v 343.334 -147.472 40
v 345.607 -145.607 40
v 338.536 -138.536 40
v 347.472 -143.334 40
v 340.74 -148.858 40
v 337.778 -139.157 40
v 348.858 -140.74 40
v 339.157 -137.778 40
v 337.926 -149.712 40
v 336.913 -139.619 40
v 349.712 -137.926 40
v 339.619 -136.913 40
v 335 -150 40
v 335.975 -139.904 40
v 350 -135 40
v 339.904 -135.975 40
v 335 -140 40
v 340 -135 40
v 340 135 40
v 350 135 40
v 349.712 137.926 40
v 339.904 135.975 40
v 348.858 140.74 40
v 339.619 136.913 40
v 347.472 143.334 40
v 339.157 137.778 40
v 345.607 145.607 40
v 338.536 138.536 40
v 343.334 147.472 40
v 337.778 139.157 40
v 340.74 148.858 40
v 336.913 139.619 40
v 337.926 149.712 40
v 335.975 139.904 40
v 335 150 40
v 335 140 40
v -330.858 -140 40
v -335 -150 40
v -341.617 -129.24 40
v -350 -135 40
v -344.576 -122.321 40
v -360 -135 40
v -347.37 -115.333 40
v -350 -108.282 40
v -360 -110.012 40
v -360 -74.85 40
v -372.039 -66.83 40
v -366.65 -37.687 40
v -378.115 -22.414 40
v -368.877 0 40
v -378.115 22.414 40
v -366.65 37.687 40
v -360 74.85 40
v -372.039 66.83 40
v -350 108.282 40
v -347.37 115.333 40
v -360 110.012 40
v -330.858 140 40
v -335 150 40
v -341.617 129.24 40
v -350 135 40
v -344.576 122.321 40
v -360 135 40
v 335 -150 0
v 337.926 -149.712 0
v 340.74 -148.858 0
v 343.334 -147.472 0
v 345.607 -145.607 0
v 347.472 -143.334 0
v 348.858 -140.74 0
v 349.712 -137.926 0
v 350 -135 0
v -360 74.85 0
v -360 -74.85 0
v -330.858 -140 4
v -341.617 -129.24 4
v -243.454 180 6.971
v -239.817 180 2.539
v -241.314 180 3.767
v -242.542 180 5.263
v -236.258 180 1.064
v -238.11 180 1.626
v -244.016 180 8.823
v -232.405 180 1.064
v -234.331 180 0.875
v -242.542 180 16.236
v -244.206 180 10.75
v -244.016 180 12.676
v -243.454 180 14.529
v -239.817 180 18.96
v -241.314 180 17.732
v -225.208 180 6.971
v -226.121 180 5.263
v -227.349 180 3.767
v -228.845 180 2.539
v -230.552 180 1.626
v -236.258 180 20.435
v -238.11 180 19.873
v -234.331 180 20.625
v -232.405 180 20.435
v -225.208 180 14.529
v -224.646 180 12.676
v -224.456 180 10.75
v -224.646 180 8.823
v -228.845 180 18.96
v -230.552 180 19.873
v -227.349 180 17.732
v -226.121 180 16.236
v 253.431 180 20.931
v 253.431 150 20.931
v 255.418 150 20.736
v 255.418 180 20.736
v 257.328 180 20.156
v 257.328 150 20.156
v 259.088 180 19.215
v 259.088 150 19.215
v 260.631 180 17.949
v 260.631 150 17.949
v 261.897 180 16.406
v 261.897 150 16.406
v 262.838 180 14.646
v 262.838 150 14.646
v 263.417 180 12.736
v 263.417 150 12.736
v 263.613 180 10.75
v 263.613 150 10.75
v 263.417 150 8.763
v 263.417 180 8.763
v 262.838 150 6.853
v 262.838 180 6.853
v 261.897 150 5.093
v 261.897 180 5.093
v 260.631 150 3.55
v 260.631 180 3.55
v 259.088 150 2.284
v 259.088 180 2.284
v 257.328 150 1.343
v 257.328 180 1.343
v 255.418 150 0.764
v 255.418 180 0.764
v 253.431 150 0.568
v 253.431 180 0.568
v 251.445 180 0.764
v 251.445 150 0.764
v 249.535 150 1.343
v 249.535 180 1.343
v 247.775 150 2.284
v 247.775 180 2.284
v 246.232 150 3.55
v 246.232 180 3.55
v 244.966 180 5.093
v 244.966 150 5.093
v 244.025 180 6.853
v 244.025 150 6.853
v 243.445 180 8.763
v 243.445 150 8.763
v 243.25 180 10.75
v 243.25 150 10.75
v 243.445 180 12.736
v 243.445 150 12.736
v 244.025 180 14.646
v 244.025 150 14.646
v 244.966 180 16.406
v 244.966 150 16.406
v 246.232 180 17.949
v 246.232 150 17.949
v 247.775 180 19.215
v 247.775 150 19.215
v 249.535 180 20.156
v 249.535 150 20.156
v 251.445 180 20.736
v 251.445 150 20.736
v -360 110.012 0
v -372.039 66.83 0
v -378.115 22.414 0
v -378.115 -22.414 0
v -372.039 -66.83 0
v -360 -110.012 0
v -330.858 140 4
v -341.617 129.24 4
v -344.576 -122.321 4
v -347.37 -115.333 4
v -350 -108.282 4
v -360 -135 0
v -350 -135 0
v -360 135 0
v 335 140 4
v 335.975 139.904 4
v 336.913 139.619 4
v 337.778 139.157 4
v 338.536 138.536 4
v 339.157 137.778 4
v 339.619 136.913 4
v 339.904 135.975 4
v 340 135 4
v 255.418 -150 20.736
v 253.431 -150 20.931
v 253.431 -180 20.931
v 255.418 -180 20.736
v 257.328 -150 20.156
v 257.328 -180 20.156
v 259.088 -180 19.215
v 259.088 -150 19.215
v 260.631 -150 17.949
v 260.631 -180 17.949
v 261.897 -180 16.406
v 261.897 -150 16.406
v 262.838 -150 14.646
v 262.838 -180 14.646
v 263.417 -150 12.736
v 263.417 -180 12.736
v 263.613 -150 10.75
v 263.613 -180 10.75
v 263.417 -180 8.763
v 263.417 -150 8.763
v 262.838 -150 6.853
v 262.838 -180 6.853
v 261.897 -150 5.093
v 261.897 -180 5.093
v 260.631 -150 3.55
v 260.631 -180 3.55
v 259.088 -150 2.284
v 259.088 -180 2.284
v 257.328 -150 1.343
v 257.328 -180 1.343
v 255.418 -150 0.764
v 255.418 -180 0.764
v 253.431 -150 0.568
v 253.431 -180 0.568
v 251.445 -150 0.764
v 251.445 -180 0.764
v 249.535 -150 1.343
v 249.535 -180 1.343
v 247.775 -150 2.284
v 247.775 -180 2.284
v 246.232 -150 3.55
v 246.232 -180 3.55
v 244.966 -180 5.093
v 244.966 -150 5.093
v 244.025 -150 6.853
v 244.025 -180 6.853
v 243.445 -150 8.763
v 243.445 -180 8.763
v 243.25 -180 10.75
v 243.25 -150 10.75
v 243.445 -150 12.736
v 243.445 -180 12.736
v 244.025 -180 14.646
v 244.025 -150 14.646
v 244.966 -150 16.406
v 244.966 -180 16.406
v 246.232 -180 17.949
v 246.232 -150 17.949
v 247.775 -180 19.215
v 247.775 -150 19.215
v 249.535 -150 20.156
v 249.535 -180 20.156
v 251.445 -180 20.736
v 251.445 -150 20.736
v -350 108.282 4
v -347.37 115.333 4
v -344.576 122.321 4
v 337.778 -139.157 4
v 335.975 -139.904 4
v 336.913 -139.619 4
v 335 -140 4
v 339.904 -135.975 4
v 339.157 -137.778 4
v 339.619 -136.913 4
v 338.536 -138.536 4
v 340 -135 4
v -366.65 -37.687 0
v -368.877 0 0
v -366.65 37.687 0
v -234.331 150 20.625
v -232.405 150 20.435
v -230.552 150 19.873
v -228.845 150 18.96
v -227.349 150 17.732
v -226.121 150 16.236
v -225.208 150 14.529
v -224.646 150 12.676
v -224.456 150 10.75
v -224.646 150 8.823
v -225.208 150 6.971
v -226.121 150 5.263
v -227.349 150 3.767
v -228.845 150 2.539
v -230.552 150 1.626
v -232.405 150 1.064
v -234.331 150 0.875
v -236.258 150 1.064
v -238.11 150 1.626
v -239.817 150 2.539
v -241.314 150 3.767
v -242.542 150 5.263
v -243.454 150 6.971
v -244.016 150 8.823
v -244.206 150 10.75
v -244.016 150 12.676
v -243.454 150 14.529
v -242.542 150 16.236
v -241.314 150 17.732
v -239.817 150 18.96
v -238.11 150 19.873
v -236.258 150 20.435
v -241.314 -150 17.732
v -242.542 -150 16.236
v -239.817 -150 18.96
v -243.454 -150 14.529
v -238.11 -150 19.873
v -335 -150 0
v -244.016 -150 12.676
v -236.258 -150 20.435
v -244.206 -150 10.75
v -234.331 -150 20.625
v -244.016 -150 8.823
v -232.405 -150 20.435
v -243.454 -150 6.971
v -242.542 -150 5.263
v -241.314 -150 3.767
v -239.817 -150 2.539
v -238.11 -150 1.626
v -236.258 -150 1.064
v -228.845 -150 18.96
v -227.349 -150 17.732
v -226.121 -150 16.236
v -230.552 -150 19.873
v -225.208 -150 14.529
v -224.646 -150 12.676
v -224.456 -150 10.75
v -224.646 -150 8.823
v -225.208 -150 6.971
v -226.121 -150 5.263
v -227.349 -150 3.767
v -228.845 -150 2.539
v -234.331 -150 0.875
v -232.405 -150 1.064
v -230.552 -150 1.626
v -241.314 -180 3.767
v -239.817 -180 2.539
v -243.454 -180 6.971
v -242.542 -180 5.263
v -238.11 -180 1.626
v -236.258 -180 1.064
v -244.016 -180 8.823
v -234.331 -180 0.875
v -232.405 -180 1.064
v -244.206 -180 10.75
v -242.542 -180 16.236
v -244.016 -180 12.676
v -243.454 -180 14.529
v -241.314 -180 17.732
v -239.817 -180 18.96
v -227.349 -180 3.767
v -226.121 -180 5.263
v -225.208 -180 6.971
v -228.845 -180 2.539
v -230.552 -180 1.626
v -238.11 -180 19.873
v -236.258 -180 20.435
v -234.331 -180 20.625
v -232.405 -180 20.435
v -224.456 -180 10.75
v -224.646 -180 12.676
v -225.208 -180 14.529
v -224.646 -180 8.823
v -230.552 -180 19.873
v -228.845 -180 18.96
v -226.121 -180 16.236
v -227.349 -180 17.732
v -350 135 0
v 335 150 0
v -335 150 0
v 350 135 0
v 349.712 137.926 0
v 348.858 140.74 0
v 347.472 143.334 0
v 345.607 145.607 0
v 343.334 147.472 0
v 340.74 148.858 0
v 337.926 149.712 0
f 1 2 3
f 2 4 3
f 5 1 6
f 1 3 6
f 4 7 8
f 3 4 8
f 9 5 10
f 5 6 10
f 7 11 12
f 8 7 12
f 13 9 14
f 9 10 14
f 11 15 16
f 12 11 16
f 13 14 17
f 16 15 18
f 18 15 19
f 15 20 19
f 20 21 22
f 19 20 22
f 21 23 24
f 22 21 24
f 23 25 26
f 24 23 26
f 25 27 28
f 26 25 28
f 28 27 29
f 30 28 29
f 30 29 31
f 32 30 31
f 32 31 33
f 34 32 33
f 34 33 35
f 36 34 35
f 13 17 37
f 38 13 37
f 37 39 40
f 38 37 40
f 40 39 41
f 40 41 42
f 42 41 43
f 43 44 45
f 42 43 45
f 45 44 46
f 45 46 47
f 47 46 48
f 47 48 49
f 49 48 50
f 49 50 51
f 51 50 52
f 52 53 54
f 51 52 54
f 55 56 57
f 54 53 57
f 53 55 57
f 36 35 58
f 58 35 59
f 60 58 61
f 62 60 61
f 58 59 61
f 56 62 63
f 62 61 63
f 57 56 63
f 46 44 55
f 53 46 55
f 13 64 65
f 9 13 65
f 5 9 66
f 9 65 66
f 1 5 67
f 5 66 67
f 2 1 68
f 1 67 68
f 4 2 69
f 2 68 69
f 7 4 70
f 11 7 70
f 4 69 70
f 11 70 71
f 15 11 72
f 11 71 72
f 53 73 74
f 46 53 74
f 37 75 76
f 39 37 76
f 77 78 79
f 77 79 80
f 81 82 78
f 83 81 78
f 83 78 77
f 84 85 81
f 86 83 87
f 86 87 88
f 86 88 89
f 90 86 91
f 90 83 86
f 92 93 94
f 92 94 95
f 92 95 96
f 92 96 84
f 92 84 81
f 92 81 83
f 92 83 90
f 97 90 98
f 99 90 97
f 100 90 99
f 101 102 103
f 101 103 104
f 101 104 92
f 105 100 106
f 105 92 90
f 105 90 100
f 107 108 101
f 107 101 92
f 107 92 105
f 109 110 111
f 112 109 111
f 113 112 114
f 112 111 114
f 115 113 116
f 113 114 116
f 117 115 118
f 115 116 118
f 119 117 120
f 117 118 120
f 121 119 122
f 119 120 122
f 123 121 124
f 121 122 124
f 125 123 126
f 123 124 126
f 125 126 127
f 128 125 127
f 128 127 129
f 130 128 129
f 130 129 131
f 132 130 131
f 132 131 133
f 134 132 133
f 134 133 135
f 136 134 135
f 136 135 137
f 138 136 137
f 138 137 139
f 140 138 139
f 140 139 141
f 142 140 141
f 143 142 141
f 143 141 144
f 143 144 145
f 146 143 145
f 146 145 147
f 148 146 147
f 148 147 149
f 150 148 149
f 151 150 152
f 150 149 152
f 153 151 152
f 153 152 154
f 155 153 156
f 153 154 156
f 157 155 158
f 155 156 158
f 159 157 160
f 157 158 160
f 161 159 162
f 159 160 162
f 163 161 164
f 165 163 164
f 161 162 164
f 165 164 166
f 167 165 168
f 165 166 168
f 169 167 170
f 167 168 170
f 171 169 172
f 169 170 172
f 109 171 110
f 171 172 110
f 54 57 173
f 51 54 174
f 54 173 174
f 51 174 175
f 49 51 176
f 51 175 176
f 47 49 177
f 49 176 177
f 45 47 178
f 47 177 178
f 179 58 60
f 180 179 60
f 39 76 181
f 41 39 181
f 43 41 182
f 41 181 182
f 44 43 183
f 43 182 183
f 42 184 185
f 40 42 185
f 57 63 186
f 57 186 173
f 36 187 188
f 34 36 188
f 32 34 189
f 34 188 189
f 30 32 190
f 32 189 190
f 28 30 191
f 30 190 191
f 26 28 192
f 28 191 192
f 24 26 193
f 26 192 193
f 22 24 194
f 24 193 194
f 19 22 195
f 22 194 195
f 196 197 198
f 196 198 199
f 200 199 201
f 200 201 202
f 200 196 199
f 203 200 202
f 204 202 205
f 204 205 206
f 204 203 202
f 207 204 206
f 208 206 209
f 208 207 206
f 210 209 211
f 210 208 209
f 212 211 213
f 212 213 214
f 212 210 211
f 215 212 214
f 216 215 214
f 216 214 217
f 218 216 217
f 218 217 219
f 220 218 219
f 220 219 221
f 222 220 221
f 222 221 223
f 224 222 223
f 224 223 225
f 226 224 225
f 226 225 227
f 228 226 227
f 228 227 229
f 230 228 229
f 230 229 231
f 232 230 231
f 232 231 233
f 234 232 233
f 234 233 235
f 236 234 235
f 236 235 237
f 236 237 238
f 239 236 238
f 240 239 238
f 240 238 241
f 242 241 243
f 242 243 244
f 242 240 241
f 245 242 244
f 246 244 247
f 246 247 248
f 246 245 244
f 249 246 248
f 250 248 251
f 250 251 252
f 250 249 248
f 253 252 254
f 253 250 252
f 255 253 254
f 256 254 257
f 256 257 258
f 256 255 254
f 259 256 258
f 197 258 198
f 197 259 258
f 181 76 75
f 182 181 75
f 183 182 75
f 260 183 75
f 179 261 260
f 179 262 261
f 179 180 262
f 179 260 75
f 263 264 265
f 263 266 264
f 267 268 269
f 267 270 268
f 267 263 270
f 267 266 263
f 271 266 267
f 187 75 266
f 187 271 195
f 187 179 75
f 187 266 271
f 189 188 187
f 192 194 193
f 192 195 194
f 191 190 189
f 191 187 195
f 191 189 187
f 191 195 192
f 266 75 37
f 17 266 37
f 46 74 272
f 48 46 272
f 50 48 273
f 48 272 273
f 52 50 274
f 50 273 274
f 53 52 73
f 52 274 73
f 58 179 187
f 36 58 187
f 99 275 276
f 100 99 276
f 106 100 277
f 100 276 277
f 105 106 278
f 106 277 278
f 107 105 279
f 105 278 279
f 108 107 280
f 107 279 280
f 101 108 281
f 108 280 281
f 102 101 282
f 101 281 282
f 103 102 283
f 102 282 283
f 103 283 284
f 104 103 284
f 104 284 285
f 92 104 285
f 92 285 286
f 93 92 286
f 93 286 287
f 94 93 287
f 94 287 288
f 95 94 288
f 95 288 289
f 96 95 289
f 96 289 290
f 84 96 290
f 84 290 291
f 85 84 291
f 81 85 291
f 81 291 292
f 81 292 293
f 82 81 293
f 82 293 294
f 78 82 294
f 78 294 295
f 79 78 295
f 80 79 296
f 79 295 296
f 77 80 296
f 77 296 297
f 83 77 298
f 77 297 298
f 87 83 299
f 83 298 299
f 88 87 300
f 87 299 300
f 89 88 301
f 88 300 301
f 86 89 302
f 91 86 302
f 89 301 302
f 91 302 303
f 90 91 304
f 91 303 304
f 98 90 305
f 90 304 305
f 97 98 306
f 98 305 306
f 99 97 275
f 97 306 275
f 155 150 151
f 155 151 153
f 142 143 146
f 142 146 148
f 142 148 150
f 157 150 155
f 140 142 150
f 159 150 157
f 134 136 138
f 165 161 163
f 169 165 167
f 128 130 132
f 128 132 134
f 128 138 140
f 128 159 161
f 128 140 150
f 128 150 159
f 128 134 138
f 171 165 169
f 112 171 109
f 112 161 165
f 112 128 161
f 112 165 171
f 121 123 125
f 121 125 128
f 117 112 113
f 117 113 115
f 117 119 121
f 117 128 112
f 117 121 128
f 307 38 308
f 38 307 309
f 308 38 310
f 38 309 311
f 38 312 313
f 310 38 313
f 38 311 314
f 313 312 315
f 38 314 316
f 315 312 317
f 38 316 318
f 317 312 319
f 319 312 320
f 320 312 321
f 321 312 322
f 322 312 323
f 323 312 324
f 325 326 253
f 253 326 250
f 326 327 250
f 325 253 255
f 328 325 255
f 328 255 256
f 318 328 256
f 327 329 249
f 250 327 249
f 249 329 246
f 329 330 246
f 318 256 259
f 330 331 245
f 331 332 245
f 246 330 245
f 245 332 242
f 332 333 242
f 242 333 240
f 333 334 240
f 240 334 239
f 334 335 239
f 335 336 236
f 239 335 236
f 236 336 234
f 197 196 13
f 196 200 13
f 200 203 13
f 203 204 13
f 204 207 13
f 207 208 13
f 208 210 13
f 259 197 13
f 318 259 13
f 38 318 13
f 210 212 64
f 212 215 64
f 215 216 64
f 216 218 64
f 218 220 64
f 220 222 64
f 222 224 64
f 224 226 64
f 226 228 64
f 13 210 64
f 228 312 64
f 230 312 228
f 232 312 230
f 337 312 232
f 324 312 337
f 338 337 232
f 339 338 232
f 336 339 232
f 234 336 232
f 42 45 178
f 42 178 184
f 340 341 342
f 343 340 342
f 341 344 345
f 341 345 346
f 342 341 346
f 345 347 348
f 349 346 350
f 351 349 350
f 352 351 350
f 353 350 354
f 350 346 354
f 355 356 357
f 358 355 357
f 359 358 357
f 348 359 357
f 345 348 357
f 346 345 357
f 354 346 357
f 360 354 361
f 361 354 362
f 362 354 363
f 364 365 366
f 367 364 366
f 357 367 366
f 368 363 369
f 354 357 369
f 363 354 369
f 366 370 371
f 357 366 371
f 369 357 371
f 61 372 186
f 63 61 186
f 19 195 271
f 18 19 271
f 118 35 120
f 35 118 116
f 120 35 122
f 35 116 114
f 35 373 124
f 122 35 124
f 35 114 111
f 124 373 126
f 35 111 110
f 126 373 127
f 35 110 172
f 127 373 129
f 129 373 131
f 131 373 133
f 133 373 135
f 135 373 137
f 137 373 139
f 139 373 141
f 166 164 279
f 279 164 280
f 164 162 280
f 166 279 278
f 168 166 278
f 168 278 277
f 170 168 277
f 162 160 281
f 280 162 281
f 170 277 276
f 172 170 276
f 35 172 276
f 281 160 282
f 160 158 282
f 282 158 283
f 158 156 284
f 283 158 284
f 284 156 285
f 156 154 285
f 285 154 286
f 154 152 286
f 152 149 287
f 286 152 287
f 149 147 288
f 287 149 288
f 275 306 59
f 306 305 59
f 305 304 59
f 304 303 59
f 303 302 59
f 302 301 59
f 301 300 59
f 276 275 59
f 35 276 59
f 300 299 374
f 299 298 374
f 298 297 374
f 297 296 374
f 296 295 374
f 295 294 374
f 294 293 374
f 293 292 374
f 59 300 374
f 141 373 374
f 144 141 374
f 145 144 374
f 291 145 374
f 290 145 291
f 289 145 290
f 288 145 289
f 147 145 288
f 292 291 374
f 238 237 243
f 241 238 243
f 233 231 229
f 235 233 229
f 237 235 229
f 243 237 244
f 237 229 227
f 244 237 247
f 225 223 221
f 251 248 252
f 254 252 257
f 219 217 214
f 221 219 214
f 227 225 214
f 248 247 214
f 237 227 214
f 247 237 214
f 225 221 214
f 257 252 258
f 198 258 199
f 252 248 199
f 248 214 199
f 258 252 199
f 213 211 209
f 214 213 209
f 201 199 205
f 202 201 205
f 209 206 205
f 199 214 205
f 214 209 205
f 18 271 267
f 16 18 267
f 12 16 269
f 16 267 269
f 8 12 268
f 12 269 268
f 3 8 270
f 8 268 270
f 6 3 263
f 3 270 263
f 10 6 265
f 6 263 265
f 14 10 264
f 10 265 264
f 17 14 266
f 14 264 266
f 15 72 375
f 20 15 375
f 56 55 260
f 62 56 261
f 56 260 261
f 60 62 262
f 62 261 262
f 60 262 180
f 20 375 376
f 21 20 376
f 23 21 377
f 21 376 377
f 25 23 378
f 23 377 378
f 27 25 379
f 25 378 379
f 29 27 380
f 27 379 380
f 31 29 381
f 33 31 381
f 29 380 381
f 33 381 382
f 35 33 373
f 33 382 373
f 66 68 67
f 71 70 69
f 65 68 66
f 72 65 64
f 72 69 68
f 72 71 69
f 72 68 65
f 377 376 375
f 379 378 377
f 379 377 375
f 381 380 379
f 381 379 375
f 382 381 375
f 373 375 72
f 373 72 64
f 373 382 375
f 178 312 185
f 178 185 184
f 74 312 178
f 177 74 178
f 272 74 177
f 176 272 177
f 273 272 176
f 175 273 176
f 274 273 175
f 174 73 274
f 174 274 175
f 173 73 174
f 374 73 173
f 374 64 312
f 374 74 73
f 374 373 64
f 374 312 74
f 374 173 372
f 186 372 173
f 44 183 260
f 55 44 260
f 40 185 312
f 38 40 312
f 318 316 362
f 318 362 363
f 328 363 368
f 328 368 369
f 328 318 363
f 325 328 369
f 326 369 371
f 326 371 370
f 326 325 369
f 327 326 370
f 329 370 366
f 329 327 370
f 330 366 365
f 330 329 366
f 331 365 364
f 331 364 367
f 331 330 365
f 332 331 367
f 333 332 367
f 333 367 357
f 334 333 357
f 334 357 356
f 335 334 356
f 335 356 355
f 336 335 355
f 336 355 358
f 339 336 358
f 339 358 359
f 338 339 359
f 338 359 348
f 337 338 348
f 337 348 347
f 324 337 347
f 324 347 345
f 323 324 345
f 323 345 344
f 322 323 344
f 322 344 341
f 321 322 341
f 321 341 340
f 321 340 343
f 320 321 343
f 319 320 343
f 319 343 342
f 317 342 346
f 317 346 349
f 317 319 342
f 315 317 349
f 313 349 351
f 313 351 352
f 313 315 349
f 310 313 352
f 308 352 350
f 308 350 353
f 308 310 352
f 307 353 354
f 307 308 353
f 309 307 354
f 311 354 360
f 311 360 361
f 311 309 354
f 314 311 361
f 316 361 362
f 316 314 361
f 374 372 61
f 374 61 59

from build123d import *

# Parameters (mm, degrees)
SKETCH_2_R        = 9.874937623
EXTRUDE_1_DEPTH   = 40
SKETCH_2_R_2      = 10.181689967
EXTRUDE_1_2_DEPTH = 40
EXTRUDE_1_3_DEPTH = 40
EXTRUDE_5_DEPTH   = 40
EXTRUDE_2_DEPTH   = 4


# Read off the part's stored shape, not the designer's step: 拉伸-薄壁1
with BuildPart() as part:
    # 草图2 → Extrude 1 (new body)
    with BuildSketch(Plane(origin=(0, 140, 0), x_dir=(1, 0, 0), z_dir=(0, 1, 0))):
        with Locations(Location((-234.331213423, -10.749627478, 0), (0, 0, 270))):
            Circle(SKETCH_2_R)
    extrude_1 = extrude(amount=EXTRUDE_1_DEPTH)



with BuildPart() as body_2:
    # 草图2 → Extrude 1 2 (new body)
    with BuildSketch(Plane(origin=(0, 140, 0), x_dir=(1, 0, 0), z_dir=(0, 1, 0))):
        with Locations(Location((253.431386216, -10.749627478, 0), (0, 0, 270))):
            Circle(SKETCH_2_R_2)
    extrude_1_2 = extrude(amount=EXTRUDE_1_2_DEPTH)


with BuildPart() as part_1:
    add(part.part)

    add(body_2.part)  # Extrude 1 3 merges body 2
    # Extrude 1 3 outline → Extrude 1 3 (add)
    with BuildSketch(Plane.XY):
        with BuildLine():
            Line((-360, -135), (-350, -135))
            Line((-350, -135), (-335, -150))
            Line((-335, -150), (335, -150))
            ThreePointArc((335, -150), (345.606601718, -145.606601718), (350, -135))
            Line((350, -135), (350, 135))
            ThreePointArc((350, 135), (345.606601718, 145.606601718), (335, 150))
            Line((335, 150), (-335, 150))
            Line((-335, 150), (-335, 140))
            Line((-335, 140), (335, 140))
            ThreePointArc((335, 140), (338.535533906, 138.535533906), (340, 135))
            Line((340, 135), (340, -135))
            ThreePointArc((340, -135), (338.535533906, -138.535533906), (335, -140))
            Line((335, -140), (-330.857864376, -140))
            Line((-330.857864376, -140), (-341.617461171, -129.240403205))
            ThreePointArc((-341.617461171, -129.240403205), (-345.993586414, -118.835156387), (-350, -108.282039139))
            Line((-350, -108.282039139), (-350, 108.282039139))
            ThreePointArc((-350, 108.282039139), (-345.653254032, 119.682560505), (-340.875063682, 130.909090909))
            Line((-340.875063682, 130.909090909), (-350, 135))
            Line((-350, 135), (-360, 135))
            Line((-360, 135), (-360, 110.011554075))
            ThreePointArc((-360, 110.011554075), (-378.877101502, 0), (-360, -110.011554075))
            Line((-360, -110.011554075), (-360, -135))
        make_face()
        with BuildLine():
            Line((-360, 74.850130461), (-360, -74.850130461))
            ThreePointArc((-360, -74.850130461), (-368.877101502, 0), (-360, 74.850130461))
        make_face(mode=Mode.SUBTRACT)
    extrude(amount=EXTRUDE_1_3_DEPTH)

    # 镜向3: Extrude 1, Extrude 1 2 across plane
    add(extrude_1.mirror(Plane.ZX))
    add(extrude_1_2.mirror(Plane.ZX))

    # 草图1<3> → 拉伸-薄壁5 (add)
    with BuildSketch(Plane.XY):
        Polygon((-350, 135), (-335, 150), (-327.928932188, 142.928932188), (-342.928932188, 127.928932188), align=None)
    extrude(amount=EXTRUDE_5_DEPTH)

    # 草图1<4> → 凸台-拉伸2 (add)
    with BuildSketch(Plane.XY):
        with BuildLine():
            Line((-335, -150), (335, -150))
            ThreePointArc((335, -150), (345.606601718, -145.606601718), (350, -135))
            Line((350, -135), (350, 135))
            ThreePointArc((350, 135), (345.606601718, 145.606601718), (335, 150))
            Line((335, 150), (-335, 150))
            Line((-335, 150), (-350, 135))
            Line((-350, 135), (-350, -135))
            Line((-350, -135), (-335, -150))
        make_face()
    extrude(amount=EXTRUDE_2_DEPTH)


solid = part_1.part
